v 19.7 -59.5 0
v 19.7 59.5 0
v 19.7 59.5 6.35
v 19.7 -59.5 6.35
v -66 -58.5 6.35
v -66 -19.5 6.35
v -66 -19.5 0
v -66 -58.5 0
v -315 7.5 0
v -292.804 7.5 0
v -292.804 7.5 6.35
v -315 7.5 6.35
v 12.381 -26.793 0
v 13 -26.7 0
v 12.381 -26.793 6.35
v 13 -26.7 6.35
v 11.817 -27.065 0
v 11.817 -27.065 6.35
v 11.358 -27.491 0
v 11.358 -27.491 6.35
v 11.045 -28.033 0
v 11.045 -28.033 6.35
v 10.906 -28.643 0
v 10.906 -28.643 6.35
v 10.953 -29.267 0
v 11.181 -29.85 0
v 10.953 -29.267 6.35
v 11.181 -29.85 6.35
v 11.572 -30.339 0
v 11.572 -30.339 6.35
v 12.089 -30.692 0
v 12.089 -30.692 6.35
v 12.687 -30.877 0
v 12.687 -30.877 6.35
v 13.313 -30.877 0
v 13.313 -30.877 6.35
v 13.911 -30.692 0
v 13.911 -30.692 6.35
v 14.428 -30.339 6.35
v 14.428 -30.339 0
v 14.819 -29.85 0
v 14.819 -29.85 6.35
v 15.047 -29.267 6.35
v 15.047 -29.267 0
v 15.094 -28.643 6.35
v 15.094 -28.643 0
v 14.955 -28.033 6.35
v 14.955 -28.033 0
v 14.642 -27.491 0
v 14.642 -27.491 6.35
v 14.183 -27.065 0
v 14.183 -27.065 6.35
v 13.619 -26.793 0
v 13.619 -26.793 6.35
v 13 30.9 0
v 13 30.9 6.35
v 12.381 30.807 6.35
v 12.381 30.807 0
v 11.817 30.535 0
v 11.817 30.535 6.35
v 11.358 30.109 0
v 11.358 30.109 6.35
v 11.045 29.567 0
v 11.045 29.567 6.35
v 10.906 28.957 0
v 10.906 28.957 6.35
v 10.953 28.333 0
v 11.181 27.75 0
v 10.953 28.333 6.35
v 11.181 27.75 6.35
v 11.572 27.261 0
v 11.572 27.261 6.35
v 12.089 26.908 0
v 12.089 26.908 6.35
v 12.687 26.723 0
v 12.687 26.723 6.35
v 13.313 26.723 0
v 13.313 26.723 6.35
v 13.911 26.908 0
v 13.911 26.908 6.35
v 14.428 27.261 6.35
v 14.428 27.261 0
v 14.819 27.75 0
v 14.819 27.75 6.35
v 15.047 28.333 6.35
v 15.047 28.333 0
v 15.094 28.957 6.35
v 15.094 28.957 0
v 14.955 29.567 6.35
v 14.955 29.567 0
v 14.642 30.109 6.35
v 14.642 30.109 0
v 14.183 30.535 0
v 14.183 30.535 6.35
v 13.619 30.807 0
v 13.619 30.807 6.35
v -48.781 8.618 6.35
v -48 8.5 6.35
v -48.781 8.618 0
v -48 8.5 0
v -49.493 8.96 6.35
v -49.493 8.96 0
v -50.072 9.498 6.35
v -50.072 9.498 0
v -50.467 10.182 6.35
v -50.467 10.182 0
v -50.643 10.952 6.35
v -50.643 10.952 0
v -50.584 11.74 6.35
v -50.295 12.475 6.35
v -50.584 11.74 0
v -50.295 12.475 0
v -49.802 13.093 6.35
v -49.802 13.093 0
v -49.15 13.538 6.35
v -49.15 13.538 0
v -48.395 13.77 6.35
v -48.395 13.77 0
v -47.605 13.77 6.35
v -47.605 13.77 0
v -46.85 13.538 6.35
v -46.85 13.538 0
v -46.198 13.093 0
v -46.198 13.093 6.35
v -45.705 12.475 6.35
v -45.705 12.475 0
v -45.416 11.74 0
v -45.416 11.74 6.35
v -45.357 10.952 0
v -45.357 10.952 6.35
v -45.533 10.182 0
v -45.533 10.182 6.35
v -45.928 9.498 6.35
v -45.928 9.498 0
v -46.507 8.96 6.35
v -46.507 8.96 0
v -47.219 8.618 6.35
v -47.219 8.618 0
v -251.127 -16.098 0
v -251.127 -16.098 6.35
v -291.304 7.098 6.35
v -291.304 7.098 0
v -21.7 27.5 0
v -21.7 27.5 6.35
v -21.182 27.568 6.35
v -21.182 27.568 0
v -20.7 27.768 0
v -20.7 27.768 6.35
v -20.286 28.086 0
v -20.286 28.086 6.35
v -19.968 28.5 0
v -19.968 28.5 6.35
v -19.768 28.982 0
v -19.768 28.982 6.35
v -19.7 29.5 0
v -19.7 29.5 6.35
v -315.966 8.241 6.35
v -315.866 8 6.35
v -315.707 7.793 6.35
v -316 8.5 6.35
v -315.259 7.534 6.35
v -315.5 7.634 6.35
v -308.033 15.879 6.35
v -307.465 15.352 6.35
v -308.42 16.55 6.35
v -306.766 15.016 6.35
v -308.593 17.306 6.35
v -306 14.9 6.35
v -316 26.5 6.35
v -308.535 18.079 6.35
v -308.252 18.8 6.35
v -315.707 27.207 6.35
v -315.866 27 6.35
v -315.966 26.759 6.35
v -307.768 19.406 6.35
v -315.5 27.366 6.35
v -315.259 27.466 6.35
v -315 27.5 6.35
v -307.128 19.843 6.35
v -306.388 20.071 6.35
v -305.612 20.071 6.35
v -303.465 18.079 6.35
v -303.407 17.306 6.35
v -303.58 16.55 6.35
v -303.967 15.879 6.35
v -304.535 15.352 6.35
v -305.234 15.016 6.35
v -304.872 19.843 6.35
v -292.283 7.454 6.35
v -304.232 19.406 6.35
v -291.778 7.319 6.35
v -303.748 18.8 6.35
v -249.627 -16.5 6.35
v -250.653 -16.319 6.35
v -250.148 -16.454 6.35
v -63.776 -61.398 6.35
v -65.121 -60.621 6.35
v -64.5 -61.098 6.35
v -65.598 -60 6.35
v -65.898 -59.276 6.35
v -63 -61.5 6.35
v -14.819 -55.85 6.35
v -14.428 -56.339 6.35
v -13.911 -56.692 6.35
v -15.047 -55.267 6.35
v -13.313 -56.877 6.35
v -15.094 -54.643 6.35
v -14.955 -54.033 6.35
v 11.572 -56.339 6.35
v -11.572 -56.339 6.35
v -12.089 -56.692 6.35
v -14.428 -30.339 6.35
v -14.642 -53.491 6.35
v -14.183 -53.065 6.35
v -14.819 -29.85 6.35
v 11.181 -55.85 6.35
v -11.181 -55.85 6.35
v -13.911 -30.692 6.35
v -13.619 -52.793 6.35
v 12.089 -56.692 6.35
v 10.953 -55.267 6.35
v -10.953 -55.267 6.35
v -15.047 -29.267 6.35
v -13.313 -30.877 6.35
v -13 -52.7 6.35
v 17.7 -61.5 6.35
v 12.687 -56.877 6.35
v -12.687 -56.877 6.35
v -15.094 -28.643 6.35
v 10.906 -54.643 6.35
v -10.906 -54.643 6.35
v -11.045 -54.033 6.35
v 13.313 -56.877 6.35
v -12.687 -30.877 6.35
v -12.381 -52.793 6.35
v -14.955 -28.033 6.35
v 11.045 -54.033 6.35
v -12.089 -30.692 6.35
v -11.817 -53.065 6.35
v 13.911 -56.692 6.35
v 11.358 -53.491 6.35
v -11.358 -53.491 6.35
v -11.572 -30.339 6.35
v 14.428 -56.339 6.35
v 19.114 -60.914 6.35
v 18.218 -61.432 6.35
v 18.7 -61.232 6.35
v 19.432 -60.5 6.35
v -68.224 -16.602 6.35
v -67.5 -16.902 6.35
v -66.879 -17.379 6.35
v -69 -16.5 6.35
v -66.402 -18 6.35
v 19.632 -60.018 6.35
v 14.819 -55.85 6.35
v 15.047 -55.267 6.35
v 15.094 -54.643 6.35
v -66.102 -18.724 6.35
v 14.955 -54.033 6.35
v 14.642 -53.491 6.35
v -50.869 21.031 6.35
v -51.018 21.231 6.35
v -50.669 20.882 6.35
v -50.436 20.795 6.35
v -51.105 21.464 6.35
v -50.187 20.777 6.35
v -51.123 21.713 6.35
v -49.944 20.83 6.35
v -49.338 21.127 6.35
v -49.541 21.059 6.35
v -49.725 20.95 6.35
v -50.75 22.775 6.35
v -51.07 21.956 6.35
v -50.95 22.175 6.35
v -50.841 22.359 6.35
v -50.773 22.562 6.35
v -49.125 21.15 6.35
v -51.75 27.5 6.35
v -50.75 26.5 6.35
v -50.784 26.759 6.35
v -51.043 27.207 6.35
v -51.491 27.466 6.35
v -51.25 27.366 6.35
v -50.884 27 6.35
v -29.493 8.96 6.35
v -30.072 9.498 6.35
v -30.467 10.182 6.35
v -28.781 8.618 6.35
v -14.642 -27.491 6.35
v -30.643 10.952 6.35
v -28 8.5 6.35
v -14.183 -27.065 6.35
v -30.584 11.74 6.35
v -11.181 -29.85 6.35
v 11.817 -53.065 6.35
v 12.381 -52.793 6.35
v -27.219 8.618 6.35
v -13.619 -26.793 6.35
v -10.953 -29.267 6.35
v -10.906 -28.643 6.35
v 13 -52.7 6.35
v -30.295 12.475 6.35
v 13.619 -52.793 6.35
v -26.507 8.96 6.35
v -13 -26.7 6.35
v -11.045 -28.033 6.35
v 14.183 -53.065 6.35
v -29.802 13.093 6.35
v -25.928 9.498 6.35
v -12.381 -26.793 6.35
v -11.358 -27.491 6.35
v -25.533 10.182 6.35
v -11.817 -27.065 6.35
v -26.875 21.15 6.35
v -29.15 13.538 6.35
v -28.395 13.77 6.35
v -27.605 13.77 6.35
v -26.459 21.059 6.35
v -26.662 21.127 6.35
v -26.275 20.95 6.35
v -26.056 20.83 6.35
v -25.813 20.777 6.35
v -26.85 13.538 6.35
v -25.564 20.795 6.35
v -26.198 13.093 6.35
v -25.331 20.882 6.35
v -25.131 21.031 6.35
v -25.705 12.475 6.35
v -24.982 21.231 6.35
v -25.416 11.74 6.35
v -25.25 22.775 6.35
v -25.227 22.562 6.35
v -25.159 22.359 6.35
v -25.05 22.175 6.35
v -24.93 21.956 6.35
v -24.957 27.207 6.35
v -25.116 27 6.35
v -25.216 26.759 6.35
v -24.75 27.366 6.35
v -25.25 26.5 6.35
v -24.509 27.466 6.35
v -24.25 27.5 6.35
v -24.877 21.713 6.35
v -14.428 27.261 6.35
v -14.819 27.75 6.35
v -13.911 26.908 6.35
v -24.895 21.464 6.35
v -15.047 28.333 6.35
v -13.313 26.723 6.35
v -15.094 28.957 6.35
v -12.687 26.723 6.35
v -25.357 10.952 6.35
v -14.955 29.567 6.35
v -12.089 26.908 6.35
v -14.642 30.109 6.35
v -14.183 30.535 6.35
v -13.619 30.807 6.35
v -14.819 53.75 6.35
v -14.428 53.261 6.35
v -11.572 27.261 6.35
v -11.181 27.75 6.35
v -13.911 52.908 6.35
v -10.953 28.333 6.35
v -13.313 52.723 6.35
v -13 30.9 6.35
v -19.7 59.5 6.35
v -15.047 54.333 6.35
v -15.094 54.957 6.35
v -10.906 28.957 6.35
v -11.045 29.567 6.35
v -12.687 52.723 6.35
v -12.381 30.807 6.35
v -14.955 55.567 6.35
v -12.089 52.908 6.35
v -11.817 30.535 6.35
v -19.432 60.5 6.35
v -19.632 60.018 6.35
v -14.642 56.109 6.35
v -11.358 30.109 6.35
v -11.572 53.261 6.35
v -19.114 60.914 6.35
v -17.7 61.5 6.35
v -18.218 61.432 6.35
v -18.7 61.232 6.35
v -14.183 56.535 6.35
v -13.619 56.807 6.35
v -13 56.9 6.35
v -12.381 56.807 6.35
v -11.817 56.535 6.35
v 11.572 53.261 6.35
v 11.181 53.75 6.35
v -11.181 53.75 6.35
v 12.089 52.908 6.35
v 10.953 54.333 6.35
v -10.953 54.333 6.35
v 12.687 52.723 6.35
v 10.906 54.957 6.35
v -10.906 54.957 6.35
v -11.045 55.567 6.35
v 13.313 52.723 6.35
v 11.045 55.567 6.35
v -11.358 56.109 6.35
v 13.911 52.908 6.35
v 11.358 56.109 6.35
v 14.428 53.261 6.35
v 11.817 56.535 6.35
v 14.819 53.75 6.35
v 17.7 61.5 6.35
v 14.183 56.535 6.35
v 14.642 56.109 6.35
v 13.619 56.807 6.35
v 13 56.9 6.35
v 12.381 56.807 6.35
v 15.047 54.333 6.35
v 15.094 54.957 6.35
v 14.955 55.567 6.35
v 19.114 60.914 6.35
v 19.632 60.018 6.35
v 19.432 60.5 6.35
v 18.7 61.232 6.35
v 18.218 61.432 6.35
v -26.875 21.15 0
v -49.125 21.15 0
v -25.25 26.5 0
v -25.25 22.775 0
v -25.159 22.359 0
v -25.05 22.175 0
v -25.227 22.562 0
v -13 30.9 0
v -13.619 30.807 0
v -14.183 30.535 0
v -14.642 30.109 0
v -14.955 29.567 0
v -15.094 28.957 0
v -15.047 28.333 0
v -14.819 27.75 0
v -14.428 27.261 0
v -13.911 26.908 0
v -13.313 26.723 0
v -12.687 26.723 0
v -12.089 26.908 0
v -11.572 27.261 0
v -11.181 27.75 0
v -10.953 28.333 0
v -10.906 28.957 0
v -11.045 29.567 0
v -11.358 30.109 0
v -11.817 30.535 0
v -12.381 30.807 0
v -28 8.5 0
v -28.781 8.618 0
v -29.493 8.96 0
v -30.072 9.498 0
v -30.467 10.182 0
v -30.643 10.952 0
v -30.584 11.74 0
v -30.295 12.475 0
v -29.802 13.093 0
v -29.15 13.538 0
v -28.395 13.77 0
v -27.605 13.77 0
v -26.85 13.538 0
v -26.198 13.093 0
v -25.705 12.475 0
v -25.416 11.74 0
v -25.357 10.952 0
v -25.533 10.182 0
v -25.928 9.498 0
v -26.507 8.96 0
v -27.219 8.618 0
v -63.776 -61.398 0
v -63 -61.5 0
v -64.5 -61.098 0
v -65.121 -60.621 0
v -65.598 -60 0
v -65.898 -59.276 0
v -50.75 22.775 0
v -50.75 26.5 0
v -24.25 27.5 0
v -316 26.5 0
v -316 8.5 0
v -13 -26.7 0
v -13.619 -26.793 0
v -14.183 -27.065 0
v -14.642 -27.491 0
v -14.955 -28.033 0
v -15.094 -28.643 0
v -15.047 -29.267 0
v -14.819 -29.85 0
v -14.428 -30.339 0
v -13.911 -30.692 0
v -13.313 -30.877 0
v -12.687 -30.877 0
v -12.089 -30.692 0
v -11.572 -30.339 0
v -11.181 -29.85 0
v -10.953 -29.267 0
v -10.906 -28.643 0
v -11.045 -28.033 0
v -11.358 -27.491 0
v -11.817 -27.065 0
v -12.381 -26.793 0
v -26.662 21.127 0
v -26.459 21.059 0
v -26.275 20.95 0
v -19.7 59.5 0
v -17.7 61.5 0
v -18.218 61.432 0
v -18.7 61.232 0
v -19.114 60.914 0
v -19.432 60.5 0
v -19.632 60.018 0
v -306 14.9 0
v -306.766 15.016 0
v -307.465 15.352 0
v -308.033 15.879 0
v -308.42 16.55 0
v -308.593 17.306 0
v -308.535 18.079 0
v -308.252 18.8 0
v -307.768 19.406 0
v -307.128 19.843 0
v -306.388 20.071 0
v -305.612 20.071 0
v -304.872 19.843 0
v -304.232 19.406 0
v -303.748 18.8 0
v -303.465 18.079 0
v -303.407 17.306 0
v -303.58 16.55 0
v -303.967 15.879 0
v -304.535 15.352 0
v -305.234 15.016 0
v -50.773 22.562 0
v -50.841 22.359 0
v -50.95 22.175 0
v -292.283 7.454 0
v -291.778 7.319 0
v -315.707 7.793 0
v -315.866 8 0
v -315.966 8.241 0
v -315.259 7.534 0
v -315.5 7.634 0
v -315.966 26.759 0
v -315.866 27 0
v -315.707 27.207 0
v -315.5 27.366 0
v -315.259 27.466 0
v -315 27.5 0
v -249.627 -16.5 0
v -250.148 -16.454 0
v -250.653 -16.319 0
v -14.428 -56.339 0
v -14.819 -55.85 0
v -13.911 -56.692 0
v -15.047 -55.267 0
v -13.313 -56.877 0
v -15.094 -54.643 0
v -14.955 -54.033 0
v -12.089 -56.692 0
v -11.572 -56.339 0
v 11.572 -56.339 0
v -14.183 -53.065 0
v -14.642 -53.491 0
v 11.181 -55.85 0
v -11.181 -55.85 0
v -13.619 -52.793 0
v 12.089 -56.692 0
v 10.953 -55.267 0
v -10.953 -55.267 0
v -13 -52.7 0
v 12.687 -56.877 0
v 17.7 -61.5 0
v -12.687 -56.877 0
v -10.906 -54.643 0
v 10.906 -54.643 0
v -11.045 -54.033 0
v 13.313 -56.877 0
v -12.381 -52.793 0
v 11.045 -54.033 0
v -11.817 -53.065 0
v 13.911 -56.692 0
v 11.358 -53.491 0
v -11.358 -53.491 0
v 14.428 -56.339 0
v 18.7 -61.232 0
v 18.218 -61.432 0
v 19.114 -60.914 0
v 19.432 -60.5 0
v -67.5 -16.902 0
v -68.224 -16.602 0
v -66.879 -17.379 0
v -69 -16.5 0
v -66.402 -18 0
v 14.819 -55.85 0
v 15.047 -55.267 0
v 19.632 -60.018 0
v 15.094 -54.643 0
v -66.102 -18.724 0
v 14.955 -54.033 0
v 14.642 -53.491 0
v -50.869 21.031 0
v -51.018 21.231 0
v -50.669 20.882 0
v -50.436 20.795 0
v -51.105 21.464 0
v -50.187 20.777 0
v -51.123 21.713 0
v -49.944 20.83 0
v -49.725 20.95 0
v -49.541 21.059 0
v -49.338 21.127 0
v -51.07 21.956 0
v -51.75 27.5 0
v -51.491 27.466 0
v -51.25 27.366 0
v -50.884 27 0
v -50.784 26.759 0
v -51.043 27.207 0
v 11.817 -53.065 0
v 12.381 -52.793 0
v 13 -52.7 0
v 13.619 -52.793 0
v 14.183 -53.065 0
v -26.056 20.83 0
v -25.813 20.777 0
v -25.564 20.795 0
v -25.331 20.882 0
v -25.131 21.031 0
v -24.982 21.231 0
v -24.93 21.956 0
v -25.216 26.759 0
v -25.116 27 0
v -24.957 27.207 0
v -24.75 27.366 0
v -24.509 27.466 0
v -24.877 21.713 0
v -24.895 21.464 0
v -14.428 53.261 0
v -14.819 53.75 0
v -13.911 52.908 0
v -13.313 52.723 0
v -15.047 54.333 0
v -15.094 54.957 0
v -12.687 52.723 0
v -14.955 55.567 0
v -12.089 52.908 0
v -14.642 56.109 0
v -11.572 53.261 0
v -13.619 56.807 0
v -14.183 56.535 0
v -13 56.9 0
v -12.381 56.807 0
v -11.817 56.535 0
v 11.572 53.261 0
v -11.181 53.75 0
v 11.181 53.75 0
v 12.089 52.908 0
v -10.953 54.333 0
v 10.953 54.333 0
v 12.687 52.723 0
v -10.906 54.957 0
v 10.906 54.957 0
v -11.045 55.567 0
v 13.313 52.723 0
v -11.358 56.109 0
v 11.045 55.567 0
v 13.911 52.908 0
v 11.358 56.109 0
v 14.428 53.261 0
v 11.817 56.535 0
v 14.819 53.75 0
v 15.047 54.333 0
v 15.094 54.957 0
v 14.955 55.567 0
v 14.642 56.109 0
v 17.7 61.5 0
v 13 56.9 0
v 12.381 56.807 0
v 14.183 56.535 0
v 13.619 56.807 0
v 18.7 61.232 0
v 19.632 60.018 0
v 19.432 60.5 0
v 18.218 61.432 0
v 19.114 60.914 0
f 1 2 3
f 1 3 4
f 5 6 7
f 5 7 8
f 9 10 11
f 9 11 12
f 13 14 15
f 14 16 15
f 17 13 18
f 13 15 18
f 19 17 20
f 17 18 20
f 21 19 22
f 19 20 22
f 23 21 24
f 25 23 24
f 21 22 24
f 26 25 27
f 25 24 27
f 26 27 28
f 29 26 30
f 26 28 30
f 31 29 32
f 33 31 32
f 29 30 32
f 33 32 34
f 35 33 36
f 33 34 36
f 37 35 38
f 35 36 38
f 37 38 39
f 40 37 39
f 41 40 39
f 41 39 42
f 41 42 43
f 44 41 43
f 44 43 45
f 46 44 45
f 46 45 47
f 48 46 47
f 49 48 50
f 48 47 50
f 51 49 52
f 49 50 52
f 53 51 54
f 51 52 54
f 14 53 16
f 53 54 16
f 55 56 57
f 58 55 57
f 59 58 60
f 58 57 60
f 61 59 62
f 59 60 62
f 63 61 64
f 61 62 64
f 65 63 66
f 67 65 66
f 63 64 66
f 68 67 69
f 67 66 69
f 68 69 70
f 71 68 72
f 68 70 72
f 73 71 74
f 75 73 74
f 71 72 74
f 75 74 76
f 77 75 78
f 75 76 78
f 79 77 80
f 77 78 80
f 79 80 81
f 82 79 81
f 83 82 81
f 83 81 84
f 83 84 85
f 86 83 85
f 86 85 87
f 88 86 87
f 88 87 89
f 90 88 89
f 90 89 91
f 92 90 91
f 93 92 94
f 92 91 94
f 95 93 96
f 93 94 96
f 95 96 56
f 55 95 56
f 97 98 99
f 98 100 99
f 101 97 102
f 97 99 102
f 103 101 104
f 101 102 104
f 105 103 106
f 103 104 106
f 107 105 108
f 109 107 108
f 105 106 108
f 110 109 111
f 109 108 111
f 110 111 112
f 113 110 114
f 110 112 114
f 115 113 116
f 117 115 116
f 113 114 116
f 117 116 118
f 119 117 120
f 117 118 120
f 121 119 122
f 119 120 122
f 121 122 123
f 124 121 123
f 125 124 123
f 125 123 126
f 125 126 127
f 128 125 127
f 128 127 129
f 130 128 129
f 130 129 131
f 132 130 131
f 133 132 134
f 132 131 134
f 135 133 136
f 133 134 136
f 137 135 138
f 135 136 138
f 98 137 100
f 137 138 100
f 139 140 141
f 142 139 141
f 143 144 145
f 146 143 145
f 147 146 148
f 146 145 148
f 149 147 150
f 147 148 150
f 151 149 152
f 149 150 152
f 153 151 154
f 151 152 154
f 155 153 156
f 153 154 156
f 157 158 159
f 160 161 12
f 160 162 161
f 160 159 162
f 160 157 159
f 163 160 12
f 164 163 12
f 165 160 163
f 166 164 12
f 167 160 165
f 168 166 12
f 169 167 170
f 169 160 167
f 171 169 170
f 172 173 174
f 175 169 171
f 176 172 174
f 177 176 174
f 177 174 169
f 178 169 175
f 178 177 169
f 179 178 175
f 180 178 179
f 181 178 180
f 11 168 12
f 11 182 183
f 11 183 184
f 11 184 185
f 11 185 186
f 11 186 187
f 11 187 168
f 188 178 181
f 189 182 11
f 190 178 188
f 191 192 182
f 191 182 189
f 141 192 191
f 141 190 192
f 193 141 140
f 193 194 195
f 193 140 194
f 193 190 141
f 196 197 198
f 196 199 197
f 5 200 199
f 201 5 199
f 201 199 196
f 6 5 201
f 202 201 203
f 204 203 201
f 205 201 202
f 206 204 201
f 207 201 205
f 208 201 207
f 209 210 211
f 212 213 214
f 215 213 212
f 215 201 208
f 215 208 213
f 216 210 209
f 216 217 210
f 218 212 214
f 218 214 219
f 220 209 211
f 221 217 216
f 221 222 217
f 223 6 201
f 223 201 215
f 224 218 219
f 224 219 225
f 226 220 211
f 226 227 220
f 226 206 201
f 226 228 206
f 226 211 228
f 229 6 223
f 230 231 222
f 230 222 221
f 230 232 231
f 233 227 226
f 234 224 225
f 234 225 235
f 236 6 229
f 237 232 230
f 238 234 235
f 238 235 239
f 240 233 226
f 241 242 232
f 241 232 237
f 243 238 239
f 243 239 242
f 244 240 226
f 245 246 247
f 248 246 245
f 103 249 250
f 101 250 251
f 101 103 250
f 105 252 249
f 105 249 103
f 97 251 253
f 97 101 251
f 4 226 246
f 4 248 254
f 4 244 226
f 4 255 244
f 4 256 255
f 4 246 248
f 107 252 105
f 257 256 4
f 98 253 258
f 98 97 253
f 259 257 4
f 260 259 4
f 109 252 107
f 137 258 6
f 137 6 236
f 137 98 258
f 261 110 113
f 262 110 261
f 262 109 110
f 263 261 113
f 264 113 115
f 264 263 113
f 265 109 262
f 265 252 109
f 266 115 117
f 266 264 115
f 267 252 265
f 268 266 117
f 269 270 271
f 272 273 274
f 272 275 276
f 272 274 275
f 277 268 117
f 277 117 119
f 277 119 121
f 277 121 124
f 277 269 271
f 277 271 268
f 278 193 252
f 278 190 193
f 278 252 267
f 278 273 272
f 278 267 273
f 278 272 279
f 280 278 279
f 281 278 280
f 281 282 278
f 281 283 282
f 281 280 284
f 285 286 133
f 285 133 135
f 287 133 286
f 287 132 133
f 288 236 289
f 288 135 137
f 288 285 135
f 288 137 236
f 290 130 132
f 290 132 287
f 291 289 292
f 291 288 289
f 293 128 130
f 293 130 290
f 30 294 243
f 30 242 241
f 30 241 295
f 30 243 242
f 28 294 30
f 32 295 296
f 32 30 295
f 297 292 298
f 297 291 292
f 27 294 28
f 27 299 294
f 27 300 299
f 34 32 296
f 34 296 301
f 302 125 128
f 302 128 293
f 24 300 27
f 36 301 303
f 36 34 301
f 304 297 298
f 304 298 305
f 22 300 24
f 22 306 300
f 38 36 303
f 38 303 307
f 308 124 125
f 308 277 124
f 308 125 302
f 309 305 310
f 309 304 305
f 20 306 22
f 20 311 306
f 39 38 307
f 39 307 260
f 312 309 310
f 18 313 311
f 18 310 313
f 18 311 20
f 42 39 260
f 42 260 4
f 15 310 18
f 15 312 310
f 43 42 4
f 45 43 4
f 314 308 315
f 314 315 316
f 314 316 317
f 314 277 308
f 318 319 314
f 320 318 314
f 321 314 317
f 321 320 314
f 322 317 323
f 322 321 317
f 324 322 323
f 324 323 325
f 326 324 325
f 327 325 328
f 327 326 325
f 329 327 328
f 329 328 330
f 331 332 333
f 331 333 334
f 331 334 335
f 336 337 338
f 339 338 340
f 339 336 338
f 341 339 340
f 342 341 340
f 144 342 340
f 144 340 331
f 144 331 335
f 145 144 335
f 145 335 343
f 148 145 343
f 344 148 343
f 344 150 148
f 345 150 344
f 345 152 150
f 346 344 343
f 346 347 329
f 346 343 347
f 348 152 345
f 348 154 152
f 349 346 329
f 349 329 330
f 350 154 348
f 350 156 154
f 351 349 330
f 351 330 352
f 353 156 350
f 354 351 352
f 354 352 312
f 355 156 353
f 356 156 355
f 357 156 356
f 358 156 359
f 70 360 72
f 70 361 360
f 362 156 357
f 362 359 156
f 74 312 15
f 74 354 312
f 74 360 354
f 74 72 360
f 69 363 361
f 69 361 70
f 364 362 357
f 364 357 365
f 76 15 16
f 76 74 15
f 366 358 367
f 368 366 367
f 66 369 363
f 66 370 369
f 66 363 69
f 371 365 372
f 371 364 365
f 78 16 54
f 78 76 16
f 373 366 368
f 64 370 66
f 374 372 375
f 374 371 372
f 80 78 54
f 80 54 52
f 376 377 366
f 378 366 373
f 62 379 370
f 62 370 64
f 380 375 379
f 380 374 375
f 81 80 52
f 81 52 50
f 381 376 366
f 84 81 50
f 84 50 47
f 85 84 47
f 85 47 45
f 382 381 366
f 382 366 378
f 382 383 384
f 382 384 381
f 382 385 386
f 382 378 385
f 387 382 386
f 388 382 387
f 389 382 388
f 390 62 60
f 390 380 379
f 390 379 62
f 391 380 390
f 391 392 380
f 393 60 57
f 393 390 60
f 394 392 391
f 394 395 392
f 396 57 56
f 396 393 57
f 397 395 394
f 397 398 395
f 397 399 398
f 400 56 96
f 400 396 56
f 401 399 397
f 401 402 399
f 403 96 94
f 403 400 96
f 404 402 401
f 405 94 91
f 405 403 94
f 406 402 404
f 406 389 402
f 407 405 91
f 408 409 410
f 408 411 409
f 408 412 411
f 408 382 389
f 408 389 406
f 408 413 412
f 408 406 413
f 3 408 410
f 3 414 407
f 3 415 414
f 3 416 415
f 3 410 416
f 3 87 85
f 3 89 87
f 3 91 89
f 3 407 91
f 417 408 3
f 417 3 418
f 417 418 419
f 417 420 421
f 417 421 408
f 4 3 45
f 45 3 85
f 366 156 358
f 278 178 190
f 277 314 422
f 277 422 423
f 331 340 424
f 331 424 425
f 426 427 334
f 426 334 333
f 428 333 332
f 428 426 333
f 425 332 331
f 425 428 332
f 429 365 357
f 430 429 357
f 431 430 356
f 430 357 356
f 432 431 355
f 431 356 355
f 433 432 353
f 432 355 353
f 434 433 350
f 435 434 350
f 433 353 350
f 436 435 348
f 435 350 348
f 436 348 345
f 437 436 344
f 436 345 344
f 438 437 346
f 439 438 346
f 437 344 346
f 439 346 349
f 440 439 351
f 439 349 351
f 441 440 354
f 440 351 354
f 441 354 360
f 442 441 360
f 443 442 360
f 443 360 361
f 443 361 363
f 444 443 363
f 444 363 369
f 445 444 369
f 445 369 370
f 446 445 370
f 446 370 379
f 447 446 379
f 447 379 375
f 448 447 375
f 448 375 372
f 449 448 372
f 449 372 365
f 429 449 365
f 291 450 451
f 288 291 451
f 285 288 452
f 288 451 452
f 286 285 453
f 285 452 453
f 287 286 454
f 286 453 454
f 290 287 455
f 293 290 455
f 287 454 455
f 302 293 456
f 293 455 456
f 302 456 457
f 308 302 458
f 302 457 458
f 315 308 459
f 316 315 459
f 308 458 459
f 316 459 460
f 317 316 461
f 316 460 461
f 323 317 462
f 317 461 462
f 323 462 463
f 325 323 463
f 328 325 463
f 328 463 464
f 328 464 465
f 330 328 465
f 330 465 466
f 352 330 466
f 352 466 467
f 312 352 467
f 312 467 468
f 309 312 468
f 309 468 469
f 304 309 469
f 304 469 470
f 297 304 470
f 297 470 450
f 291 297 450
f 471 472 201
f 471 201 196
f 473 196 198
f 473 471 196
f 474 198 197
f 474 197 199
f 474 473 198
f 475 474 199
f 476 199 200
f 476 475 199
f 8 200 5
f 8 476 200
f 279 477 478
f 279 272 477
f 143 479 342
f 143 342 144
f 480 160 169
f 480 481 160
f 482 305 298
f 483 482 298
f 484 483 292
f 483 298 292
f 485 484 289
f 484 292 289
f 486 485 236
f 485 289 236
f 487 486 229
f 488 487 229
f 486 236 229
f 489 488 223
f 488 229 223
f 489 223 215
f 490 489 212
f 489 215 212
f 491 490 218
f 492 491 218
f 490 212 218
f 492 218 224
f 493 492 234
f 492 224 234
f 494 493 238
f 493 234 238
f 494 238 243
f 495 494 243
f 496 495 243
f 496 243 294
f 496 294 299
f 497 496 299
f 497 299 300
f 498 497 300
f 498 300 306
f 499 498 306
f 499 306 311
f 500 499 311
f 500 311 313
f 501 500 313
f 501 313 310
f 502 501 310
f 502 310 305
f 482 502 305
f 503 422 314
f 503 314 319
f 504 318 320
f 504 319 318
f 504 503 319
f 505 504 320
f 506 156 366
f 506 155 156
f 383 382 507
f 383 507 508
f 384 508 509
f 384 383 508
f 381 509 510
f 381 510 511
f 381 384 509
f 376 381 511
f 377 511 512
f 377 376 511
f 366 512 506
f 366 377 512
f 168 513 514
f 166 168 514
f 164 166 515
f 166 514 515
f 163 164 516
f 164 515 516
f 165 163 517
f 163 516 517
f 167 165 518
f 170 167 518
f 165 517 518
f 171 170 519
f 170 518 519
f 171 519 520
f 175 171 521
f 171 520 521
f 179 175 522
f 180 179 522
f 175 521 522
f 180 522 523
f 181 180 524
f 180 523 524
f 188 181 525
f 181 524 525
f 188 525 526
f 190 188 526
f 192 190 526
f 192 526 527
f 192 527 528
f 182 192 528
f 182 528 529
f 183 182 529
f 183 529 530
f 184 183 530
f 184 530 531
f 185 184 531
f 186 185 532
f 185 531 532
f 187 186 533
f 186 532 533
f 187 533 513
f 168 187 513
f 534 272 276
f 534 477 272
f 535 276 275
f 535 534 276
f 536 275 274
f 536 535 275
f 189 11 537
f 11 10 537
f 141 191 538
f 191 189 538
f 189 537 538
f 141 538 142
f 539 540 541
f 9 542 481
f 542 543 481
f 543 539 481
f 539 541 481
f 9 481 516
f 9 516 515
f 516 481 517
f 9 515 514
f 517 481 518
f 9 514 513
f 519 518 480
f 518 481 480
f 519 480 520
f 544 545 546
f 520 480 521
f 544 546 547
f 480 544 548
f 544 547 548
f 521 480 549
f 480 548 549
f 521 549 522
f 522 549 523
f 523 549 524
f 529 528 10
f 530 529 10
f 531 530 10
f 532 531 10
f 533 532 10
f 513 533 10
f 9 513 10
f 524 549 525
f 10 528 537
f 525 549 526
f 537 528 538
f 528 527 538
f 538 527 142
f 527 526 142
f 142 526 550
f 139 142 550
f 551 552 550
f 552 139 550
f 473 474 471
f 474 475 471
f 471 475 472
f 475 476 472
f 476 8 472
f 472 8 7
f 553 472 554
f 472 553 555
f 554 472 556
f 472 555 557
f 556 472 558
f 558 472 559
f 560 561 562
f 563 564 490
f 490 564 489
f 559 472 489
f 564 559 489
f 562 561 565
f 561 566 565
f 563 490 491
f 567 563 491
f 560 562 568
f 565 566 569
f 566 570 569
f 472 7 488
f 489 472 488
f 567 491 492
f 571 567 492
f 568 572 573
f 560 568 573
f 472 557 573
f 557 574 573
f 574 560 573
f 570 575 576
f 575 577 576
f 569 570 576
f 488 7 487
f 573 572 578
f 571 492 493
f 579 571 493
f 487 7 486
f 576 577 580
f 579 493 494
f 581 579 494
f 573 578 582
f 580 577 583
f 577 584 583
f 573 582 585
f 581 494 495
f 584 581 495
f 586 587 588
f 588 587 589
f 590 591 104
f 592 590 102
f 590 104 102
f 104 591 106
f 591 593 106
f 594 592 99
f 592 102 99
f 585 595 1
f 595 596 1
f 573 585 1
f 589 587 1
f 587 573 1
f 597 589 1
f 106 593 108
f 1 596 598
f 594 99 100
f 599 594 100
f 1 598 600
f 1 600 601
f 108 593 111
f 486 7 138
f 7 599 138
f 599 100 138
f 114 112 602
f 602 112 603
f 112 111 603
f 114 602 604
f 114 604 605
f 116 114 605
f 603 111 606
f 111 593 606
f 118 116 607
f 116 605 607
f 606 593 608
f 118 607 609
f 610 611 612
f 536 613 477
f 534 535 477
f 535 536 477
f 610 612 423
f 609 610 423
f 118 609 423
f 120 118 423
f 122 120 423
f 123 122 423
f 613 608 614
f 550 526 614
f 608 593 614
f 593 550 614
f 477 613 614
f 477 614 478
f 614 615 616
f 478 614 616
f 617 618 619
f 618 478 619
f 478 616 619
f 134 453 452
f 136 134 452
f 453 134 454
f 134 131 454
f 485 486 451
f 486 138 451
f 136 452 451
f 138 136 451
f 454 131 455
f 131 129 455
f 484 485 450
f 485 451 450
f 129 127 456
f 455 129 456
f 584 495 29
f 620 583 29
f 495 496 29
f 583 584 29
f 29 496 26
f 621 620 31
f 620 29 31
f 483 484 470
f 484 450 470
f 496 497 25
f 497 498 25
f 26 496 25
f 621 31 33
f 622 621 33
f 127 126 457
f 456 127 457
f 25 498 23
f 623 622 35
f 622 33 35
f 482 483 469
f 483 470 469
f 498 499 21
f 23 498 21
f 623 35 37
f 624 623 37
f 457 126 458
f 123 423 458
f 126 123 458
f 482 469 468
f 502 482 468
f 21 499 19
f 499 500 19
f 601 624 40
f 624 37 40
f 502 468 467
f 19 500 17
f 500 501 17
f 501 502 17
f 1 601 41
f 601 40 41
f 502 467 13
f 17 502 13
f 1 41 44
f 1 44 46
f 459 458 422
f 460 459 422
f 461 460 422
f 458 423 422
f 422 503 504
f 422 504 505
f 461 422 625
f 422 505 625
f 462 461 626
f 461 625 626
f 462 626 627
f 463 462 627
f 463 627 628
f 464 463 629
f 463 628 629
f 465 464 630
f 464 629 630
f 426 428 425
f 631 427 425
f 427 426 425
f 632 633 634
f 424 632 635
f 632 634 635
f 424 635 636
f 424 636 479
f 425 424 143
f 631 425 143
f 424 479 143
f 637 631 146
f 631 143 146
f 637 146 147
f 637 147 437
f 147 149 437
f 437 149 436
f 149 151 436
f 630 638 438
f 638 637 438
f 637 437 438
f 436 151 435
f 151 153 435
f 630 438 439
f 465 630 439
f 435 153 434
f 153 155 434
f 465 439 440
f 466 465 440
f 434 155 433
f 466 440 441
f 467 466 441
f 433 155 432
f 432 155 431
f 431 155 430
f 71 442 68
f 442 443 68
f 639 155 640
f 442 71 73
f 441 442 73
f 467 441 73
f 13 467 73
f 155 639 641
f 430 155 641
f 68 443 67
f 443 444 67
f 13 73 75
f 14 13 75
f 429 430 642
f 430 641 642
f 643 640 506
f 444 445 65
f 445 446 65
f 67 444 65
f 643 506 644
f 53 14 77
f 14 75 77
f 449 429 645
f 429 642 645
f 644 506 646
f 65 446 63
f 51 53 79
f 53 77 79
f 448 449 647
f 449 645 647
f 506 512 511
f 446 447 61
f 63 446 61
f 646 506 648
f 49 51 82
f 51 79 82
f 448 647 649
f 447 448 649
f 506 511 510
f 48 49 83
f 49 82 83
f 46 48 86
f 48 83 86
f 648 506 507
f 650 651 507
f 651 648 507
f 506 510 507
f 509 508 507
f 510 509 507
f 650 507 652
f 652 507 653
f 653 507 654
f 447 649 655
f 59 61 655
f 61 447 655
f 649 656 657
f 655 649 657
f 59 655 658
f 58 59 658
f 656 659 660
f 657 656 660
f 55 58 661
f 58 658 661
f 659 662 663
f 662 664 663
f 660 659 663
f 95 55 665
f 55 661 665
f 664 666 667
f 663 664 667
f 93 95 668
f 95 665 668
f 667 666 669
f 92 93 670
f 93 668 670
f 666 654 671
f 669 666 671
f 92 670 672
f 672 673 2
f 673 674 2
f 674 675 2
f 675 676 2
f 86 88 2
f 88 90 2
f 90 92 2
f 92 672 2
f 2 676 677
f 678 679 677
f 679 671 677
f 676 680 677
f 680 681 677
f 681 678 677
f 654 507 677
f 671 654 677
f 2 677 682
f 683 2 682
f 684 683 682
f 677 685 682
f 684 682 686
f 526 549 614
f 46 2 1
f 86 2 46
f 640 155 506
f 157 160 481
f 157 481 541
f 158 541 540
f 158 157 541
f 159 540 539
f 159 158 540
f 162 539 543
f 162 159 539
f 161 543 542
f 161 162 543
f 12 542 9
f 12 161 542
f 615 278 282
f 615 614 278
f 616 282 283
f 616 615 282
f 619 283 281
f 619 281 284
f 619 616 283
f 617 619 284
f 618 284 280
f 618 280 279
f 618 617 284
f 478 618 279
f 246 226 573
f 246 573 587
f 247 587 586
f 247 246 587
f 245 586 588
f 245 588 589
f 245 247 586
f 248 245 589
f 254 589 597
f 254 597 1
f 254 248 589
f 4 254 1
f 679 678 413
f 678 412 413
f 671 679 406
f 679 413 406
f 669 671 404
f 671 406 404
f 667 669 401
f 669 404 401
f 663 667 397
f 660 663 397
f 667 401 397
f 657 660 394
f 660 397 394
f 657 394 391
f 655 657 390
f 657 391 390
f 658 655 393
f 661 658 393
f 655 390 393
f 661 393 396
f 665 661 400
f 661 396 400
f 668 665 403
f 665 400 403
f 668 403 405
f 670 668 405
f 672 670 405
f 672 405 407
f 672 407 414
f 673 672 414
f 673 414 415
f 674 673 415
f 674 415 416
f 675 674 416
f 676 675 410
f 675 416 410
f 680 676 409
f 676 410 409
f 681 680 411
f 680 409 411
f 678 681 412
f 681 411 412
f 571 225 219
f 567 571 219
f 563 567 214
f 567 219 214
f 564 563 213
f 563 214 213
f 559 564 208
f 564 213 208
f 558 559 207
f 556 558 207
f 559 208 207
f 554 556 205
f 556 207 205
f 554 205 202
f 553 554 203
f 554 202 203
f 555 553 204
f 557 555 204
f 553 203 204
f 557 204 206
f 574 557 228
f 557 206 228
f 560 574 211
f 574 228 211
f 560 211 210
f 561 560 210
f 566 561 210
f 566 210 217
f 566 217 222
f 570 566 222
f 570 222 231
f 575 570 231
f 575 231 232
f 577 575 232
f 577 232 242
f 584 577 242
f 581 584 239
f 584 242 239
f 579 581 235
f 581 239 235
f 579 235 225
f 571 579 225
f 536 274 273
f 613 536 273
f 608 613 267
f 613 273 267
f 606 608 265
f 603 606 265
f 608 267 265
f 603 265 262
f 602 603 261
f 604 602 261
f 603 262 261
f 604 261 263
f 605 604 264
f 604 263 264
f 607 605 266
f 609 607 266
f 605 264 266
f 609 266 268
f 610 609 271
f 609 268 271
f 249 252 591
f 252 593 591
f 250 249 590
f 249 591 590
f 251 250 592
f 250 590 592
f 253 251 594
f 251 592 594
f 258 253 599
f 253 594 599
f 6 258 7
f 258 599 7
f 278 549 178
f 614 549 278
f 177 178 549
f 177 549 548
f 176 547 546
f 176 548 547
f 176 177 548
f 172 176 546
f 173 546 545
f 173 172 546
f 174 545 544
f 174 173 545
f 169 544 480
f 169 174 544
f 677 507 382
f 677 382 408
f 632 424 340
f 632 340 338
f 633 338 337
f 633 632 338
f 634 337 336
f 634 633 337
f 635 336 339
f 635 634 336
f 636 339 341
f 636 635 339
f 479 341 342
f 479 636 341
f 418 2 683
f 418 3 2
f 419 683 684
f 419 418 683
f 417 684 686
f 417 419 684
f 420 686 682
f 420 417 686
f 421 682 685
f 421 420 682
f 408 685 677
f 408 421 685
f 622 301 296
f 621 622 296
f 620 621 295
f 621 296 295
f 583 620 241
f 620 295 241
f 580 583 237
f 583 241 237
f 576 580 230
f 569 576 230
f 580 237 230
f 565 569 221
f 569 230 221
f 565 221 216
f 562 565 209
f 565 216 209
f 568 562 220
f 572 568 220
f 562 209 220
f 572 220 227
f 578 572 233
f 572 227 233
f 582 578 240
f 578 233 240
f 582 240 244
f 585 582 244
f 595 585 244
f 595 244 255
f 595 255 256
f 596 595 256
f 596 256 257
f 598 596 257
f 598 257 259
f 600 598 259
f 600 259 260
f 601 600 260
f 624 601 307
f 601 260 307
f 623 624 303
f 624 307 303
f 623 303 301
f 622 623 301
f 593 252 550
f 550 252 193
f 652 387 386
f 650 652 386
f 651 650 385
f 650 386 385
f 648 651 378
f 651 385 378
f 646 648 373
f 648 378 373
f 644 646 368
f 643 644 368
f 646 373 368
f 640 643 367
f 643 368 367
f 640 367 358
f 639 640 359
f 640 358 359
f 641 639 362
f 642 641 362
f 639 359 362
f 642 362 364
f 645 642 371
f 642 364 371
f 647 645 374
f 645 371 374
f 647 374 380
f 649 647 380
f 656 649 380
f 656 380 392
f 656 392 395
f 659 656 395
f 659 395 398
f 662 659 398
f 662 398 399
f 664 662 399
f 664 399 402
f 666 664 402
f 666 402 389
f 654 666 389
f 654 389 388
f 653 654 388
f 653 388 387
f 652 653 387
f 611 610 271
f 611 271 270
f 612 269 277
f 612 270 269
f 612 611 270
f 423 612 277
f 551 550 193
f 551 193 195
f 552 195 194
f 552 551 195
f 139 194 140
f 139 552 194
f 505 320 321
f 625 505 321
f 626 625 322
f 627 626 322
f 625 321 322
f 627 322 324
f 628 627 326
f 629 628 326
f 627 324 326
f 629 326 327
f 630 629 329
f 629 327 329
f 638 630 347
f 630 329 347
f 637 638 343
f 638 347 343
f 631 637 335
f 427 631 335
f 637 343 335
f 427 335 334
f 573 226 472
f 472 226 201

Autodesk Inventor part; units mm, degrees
ref_plane "YZ Plane" through (0, 0, 0) normal (1, 0, 0) x (0, 1, 0)
ref_plane "XZ Plane" through (0, 0, 0) normal (0, 1, 0) x (-1, 0, 0)
sketch "Sketch1" plane through (0, 0, 0) normal (0, 0, 1) x (1, 0, 0)
  line L0 (19.7, -72.5) -> (-19.7, -72.5)
  line L1 (-19.7, -72.5) -> (-19.7, 72.5)
  line L2 (-19.7, 72.5) -> (19.7, 72.5)
  line L3 (19.7, 72.5) -> (19.7, -72.5)
  line L4 (19.7, -72.5) -> (-19.7, 72.5) construction
  line L5 (-19.7, -72.5) -> (19.7, 72.5) construction
  line L6 (19.7, 11.1) -> (-19.7, 11.1) construction
  line L7 (-19.7, 11.1) -> (-19.7, 72.5) construction
  line L8 (-19.7, 72.5) -> (19.7, 72.5) construction
  line L9 (19.7, 72.5) -> (19.7, 11.1) construction
  line L10 (19.7, 11.1) -> (-19.7, 72.5) construction
  line L11 (-19.7, 11.1) -> (19.7, 72.5) construction
  line L12 (19.7, -72.5) -> (-19.7, -72.5) construction
  line L13 (-19.7, -72.5) -> (-19.7, -11.1) construction
  line L14 (-19.7, -11.1) -> (19.7, -11.1) construction
  line L15 (19.7, -11.1) -> (19.7, -72.5) construction
  line L16 (19.7, -72.5) -> (-19.7, -11.1) construction
  line L17 (-19.7, -72.5) -> (19.7, -11.1) construction
  line L18 (19.7, 22.1) -> (-19.7, 22.1) construction
  line L19 (-19.7, 22.1) -> (-19.7, 61.5) construction
  line L20 (-19.7, 61.5) -> (19.7, 61.5)
  line L21 (19.7, 61.5) -> (19.7, 22.1) construction
  line L22 (19.7, 22.1) -> (-19.7, 61.5) construction
  line L23 (-19.7, 22.1) -> (19.7, 61.5) construction
  line L24 (19.7, -61.5) -> (-19.7, -61.5)
  line L25 (-19.7, -61.5) -> (-19.7, -22.1) construction
  line L26 (-19.7, -22.1) -> (19.7, -22.1) construction
  line L27 (19.7, -22.1) -> (19.7, -61.5) construction
  line L28 (19.7, -61.5) -> (-19.7, -22.1) construction
  line L29 (-19.7, -61.5) -> (19.7, -22.1) construction
  line L30 (13, 28.8) -> (-13, 28.8) construction
  line L31 (-13, 28.8) -> (-13, 54.8) construction
  line L32 (-13, 54.8) -> (13, 54.8) construction
  line L33 (13, 54.8) -> (13, 28.8) construction
  line L34 (13, 28.8) -> (-13, 54.8) construction
  line L35 (-13, 28.8) -> (13, 54.8) construction
  line L36 (13, -54.8) -> (-13, -54.8) construction
  line L37 (-13, -54.8) -> (-13, -28.8) construction
  line L38 (-13, -28.8) -> (13, -28.8) construction
  line L39 (13, -28.8) -> (13, -54.8) construction
  line L40 (13, -54.8) -> (-13, -28.8) construction
  line L41 (-13, -54.8) -> (13, -28.8) construction
  line L42 (-316, 27.5) -> (-19.7, 27.5)
  line L43 (-19.7, 27.5) -> (-19.7, 7.5)
  line L44 (-19.7, 7.5) -> (-316, 7.5)
  line L45 (-316, 7.5) -> (-316, 27.5)
  line L46 (19.7, -63.5) -> (19.7, -63.5)
  line L47 (19.772, 73.498) -> (19.772, 73.498)
  point P0 (0, 0)
  point P1 (0, 41.8)
  point P2 (0, -41.8)
  point P3 (-316, 17.5)
  point P4 (-291, 7.5)
  point P5 (17, 72.5)
  point P6 (17, -72.5)
  point P7 (-19.7, 27.5)
  point P8 (-19.7, 7.5)
  point P9 (-19.7, -61.5)
  point P10 (19.7, -61.5)
  dimension "d1" = 145
  dimension "d2" = 61.4
  dimension "d3" = 39.4
  dimension "d4" = 26
  dimension "d5" = 26
  dimension "d6" = 20
  dimension "d8" = 316
  dimension "d11" = 25
  dimension "d55" = 45
  dimension "d126" = 6.7
  dimension "d128" = 6.7
extrude "Extrusion1" add sketch "Sketch1" along normal blind 6.35 contours L24 L1 L20 L3 | L44 L45 L42 L1
sketch "Sketch2" plane through (0, 0, 6.35) normal (0, 0, 1) x (1, 0, 0)
  line L0 (19.7, -61.5) -> (19.7, 61.5) projected
  line L1 (-19.7, 61.5) -> (-19.7, 27.5) projected
  line L2 (-19.7, 27.5) -> (-316, 27.5) projected
  line L3 (-316, 27.5) -> (-316, 7.5) projected
  line L4 (-316, 7.5) -> (-19.7, 7.5) projected
  line L5 (-19.7, 7.5) -> (-19.7, -61.5) projected
  line L6 (19.7, -61.5) -> (-19.7, -61.5) construction
  line L7 (-19.7, -61.5) -> (19.7, -61.5) projected
  line L8 (19.7, 61.5) -> (-19.7, 61.5) projected
  line L9 (-19.7, -61.5) -> (-66, -61.5)
  line L10 (-66, -16.5) -> (-250.4308, -16.5)
  line L11 (-250.4308, -16.5) -> (-292, 7.5)
  line L12 (-66, -16.5) -> (-66, -61.5)
  point P0 (0, 0)
  point P1 (0, 41.8)
  point P2 (0, -41.8)
  point P3 (13, 28.8)
  point P4 (13, -28.8)
  dimension "d25" = 24
  dimension "d124" = 34
  dimension "d140" = 24
  dimension "d142" = 85.7
  dimension "d143" = 150
extrude "Extrusion2" add sketch "Sketch2" against normal up to surface (6.35 mm away) contours L9 L12 L10 L11 L4 L5
hole "Hole1" at (-13, 54.8, 0) at (13, 54.8, 0) at (13, 28.8, 0) at (-13, 28.8, 0) at (-13, -28.8, 0) at (13, -28.8, 0) at (13, -54.8, 0) at (-13, -54.8, 0) direction (0, 0, 1) diameter 4.2 end through all
sketch "Z POSITIONING" plane through (0, 0, 6.35) normal (0, 0, 1) x (1, 0, 0)
  circle A0 centre (-13, -54.8) radius 2.1 projected
  circle A1 centre (13, -54.8) radius 2.1 projected
  circle A2 centre (13, -28.8) radius 2.1 projected
  circle A3 centre (-13, -28.8) radius 2.1 projected
  circle A4 centre (-13, 28.8) radius 2.1 projected
  circle A5 centre (13, 28.8) radius 2.1 projected
  circle A6 centre (13, 54.8) radius 2.1 projected
  circle A7 centre (-13, 54.8) radius 2.1 projected
  line L0 (-19.7, 27.5) -> (-316, 27.5) projected
  line L1 (-316, 27.5) -> (-316, 7.5) projected
  line L2 (-316, 7.5) -> (-292, 7.5) projected
  line L3 (-73.0306, 76.9979) -> (-73.0306, 70.6479)
  line L4 (-13, 54.8) -> (13, 54.8) construction
  line L5 (-51.9212, 35.5) -> (-16.9212, 35.5) construction
  line L6 (-16.9212, 35.5) -> (-16.9212, 27.5) construction
  line L7 (-16.9212, 27.5) -> (-51.9212, 27.5) construction
  line L8 (-51.9212, 27.5) -> (-51.9212, 35.5) construction
  line L9 (-51.9212, 69.65) -> (-6.1684, 69.65) construction
  line L10 (-125.0107, 76) -> (3.0638, 76) construction
  line L11 (3.0638, 76) -> (3.0638, 69.65) construction
  line L12 (3.0638, 69.65) -> (-125.0107, 69.65) construction
  line L13 (-125.0107, 69.65) -> (-125.0107, 76) construction
  line L14 (-120.28, 89) -> (-45.2895, 89) construction
  line L15 (-45.2895, 89) -> (-45.2895, 76) construction
  line L16 (-45.2895, 76) -> (-120.28, 76) construction
  line L17 (-120.28, 76) -> (-120.28, 89) construction
  line L18 (-46.2871, 30.7481) -> (-33.7765, 30.7481) construction
  line L19 (-33.7765, 30.7481) -> (-33.7765, 27.5) construction
  line L20 (-33.7765, 27.5) -> (-46.2871, 27.5) construction
  line L21 (-46.2871, 27.5) -> (-46.2871, 30.7481) construction
  line L22 (-83.6356, 76.3105) -> (-20.2105, 76.3105) construction
  line L23 (-20.2105, 76.3105) -> (-20.2105, 72.407) construction
  line L24 (-20.2105, 72.407) -> (-83.6356, 72.407) construction
  line L25 (-83.6356, 72.407) -> (-83.6356, 76.3105) construction
  line L26 (-72.5883, 73.6984) -> (-50.3384, 73.6984) construction
  line L27 (-50.3384, 73.6984) -> (-50.3384, 69.65) construction
  line L28 (-50.3384, 69.65) -> (-72.5883, 69.65) construction
  line L29 (-72.5883, 69.65) -> (-72.5883, 73.6984) construction
  line L30 (-111.3546, 80.0484) -> (-73.1953, 80.0484) construction
  line L31 (-73.1953, 80.0484) -> (-73.1953, 76) construction
  line L32 (-73.1953, 76) -> (-111.3546, 76) construction
  line L33 (-111.3546, 76) -> (-111.3546, 80.0484) construction
  line L34 (-122.3616, 95.35) -> (-60.8324, 95.35) construction
  line L35 (-60.8324, 95.35) -> (-60.8324, 89) construction
  line L36 (-60.8324, 89) -> (-122.3616, 89) construction
  line L37 (-122.3616, 89) -> (-122.3616, 95.35) construction
  line L38 (-97.4496, 108.35) -> (-64.4997, 108.35) construction
  line L39 (-64.4997, 108.35) -> (-64.4997, 95.35) construction
  line L40 (-64.4997, 95.35) -> (-97.4496, 95.35) construction
  line L41 (-97.4496, 95.35) -> (-97.4496, 108.35) construction
  line L42 (-105.6043, 93.0261) -> (-84.5103, 93.0261) construction
  line L43 (-84.5103, 93.0261) -> (-84.5103, 89) construction
  line L44 (-84.5103, 89) -> (-105.6043, 89) construction
  line L45 (-105.6043, 89) -> (-105.6043, 93.0261) construction
  line L46 (-109.4941, 99.3984) -> (-71.3471, 99.3984) construction
  line L47 (-71.3471, 99.3984) -> (-71.3471, 95.35) construction
  line L48 (-71.3471, 95.35) -> (-109.4941, 95.35) construction
  line L49 (-109.4941, 95.35) -> (-109.4941, 99.3984) construction
  line L50 (-134.6087, 111.525) -> (-34.6087, 111.525) construction
  line L51 (-34.6087, 111.525) -> (-34.6087, 108.35) construction
  line L52 (-34.6087, 108.35) -> (-134.6087, 108.35) construction
  line L53 (-134.6087, 108.35) -> (-134.6087, 111.525) construction
  line L54 (-97.1464, 115.5511) -> (-69.166, 115.5511) construction
  line L55 (-69.166, 115.5511) -> (-69.166, 111.525) construction
  line L56 (-69.166, 111.525) -> (-97.1464, 111.525) construction
  line L57 (-97.1464, 111.525) -> (-97.1464, 115.5511) construction
  line L58 (-143.7669, 61.65) -> (-108.5896, 61.65) construction
  line L59 (-148.1315, 61.65) -> (-115.878, 61.65) construction
  line L60 (-115.878, 61.65) -> (-115.878, 58.4884) construction
  line L61 (-115.878, 58.4884) -> (-148.1315, 58.4884) construction
  line L62 (-148.1315, 58.4884) -> (-148.1315, 61.65) construction
  line L63 (-66, -61.5) -> (19.7, -61.5) projected
  line L64 (-19.7, 61.5) -> (-19.7, 27.5) projected
  line L65 (19.7, -61.5) -> (19.7, 61.5) projected
  line L66 (19.7, 61.5) -> (-19.7, 61.5) projected
  line L67 (-292, 7.5) -> (-250.4308, -16.5) projected
  line L68 (-250.4308, -16.5) -> (-66, -16.5) projected
  line L69 (-66, -16.5) -> (-66, -61.5) projected
  point P0 (0, 0)
  point P1 (0, 54.8)
  dimension "d39" = 6.35
  dimension "d42" = 35
  dimension "d43" = 8
  dimension "d44" = 34.15
  dimension "d45" = 6.35
  dimension "d46" = 13
  dimension "d48" = 6.35
  dimension "d49" = 13
  dimension "d50" = 100
  dimension "d51" = 3.175
  dimension "d52" = 46.7
  dimension "d53" = 34.15
ref_plane "PRINTBED PLANE" through (-316, 61.65, 6.35) normal (0, 1, 0) x (1, 0, 0)
sketch "Y POSITIONING" plane through (0, 0, 6.35) normal (0, 0, 1) x (1, 0, 0)
  line L0 (-315, 61.65) -> (-29, 61.65) construction
  line L1 (-306, 61.65) -> (-306, 54.4706) construction
  line L2 (-38, 61.65) -> (-38, 46.65) construction
  line L3 (-316, 27.5) -> (-316, 7.5) projected
  line L4 (-32, 27.5) -> (-44, 27.5) construction
  line L5 (-44, 27.5) -> (-44, 61.65) construction
  line L6 (-44, 61.65) -> (-32, 61.65) construction
  line L7 (-32, 61.65) -> (-32, 27.5) construction
  line L8 (-32, 27.5) -> (-44, 61.65) construction
  line L9 (-44, 27.5) -> (-32, 61.65) construction
  line L10 (-19.7, 27.5) -> (-316, 27.5) projected
  circle A0 centre (-13, -54.8) radius 2.1 projected
  circle A1 centre (13, -54.8) radius 2.1 projected
  circle A2 centre (13, -28.8) radius 2.1 projected
  circle A3 centre (-13, -28.8) radius 2.1 projected
  circle A4 centre (-13, 28.8) radius 2.1 projected
  circle A5 centre (13, 28.8) radius 2.1 projected
  circle A6 centre (13, 54.8) radius 2.1 projected
  circle A7 centre (-13, 54.8) radius 2.1 projected
  line L11 (-19.7, 27.5) -> (-316, 27.5) projected
  line L12 (-316, 27.5) -> (-316, 7.5) projected
  line L13 (-316, 7.5) -> (-292, 7.5) projected
  line L14 (-13, 54.8) -> (13, 28.8) construction
  line L15 (-383.14, 61.65) -> (86.84, 61.65) construction
  line L16 (-53, 27.5) -> (-23, 27.5) construction
  line L17 (-23, 27.5) -> (-23, 35.5) construction
  line L18 (-23, 35.5) -> (-53, 35.5) construction
  line L19 (-53, 35.5) -> (-53, 27.5) construction
  line L20 (-53, 27.5) -> (-23, 35.5) construction
  line L21 (-23, 27.5) -> (-53, 35.5) construction
  line L22 (-66, -61.5) -> (19.7, -61.5) projected
  line L23 (-58, 21.15) -> (-18, 21.15) construction
  line L24 (-18, 21.15) -> (-18, 1.15) construction
  line L25 (-18, 1.15) -> (-58, 1.15) construction
  line L26 (-58, 1.15) -> (-58, 21.15) construction
  line L27 (-48, 11.15) -> (-28, 11.15) construction
  line L28 (-19.7, 61.5) -> (-19.7, 27.5) projected
  line L29 (19.7, -61.5) -> (19.7, 61.5) projected
  line L30 (19.7, 61.5) -> (-19.7, 61.5) projected
  line L31 (-292, 7.5) -> (-250.4308, -16.5) projected
  line L32 (-250.4308, -16.5) -> (-66, -16.5) projected
  line L33 (-66, -16.5) -> (-66, -61.5) projected
  point P0 (0, 0)
  point P1 (-38, 44.575)
  point P2 (-32, 47.5)
  point P3 (0, 41.8)
  point P4 (-38, 31.5)
  point P5 (-38, 27.5)
  point P6 (-38, 21.15)
  point P7 (-38, 11.15)
  point P8 (-18, 11.15)
  dimension "d58" = 286
  dimension "d60" = 9
  dimension "d61" = 10
  dimension "d62" = 12
  dimension "d63" = 38
  dimension "d64" = 9
  dimension "d65" = 30
  dimension "d66" = 8
  dimension "d67" = 15
  dimension "d68" = 19.15
  dimension "d83" = 40
  dimension "d84" = 20
  dimension "d85" = 6.35
  dimension "d90" = 20
sketch "Sketch5" plane through (0, 0, 6.35) normal (0, 0, 1) x (1, 0, 0)
  line L0 (-296, 7.5) -> (-316, 7.5) construction
  line L1 (-316, 7.5) -> (-316, 27.5) construction
  line L2 (-316, 27.5) -> (-296, 27.5) construction
  line L3 (-296, 27.5) -> (-296, 7.5) construction
  line L4 (-296, 7.5) -> (-316, 27.5) construction
  line L5 (-316, 7.5) -> (-296, 27.5) construction
  point P0 (0, 0)
  point P1 (-306, 17.5)
  point P2 (-306, 17.5)
hole "Hole2" at (-306, 17.5, 6.35) direction (0, 0, -1) diameter 5.2 end through all
sketch "Sketch6" plane through (0, 0, 6.35) normal (0, 0, 1) x (1, 0, 0)
  line L0 (-50.75, 27.5) -> (-25.25, 27.5)
  line L1 (-25.25, 27.5) -> (-25.25, 21.15)
  line L2 (-25.25, 21.15) -> (-50.75, 21.15)
  line L3 (-50.75, 21.15) -> (-50.75, 27.5)
  line L4 (-38, 61.65) -> (-38, 46.65) construction
  line L5 (-19.7, 27.5) -> (-316, 27.5) projected
  line L6 (-58, 21.15) -> (-18, 21.15) construction
  circle A0 centre (-50.25, 21.65) radius 0.875
  circle A1 centre (-25.75, 21.65) radius 0.875
  point P0 (0, 0)
  point P1 (-38, 27.5)
  point P2 (-32, 47.5)
  point P3 (-26.4681, 21.15)
  point P4 (-25.25, 22.3681)
  point P5 (-50.75, 22.3681)
  point P6 (-49.5319, 21.15)
  dimension "d79" = 25.5
  dimension "d86" = 1.75
  dimension "d87" = 0.5
  dimension "d88" = 0.5
  dimension "d89" = 0.5
extrude "Extrusion3" cut sketch "Sketch6" against normal through all
hole "Hole3" at (-48, 11.15, 6.35) at (-28, 11.15, 6.35) direction (0, 0, -1) diameter 5.3 end through all
sketch "Sketch9" plane through (0, 0, 6.35) normal (0, 0, 1) x (1, 0, 0)
  circle A0 centre (-28, 11.15) radius 2.65 projected
  circle A1 centre (-48, 11.15) radius 2.65 projected
  line L0 (-50.75, 22.3681) -> (-50.75, 27.5) projected
  line L1 (-50.75, 27.5) -> (-316, 27.5) projected
  line L2 (-316, 27.5) -> (-316, 7.5) projected
  line L3 (-316, 7.5) -> (-292, 7.5) projected
  line L4 (-66, -61.5) -> (19.7, -61.5) projected
  line L5 (-25.25, 27.5) -> (-25.25, 22.3681) projected
  arc A2 (-26.4681, 21.15) -> (-25.25, 22.3681) centre (-25.75, 21.65) ccw projected
  line L6 (-26.4681, 21.15) -> (-49.5319, 21.15) projected
  arc A3 (-50.75, 22.3681) -> (-49.5319, 21.15) centre (-50.25, 21.65) ccw projected
  circle A4 centre (-306, 17.5) radius 2.6 projected
  circle A5 centre (-13, -54.8) radius 2.1 projected
  circle A6 centre (13, -54.8) radius 2.1 projected
  circle A7 centre (13, -28.8) radius 2.1 projected
  circle A8 centre (-13, -28.8) radius 2.1 projected
  circle A9 centre (-13, 28.8) radius 2.1 projected
  circle A10 centre (13, 28.8) radius 2.1 projected
  circle A11 centre (13, 54.8) radius 2.1 projected
  circle A12 centre (-13, 54.8) radius 2.1 projected
  line L7 (-19.7, 61.5) -> (-19.7, 27.5) projected
  line L8 (19.7, -61.5) -> (19.7, 61.5) projected
  line L9 (19.7, 61.5) -> (-19.7, 61.5) projected
  line L10 (-19.7, 27.5) -> (-25.25, 27.5) projected
  line L11 (-292, 7.5) -> (-250.4308, -16.5) projected
  line L12 (-250.4308, -16.5) -> (-66, -16.5) projected
  line L13 (-66, -16.5) -> (-66, -61.5) projected
  point P0 (0, 0)
fillet "Fillet3" radius 1 8 edges at (-316, 27.5, 3.175) (-316, 7.5, 3.175) (-50.75, 27.5, 3.175) (-50.75, 22.3681, 3.175) (-49.5319, 21.15, 3.175) (-26.4681, 21.15, 3.175) (-25.25, 22.3681, 3.175) (-25.25, 27.5, 3.175)
fillet "Fillet4" radius 3 4 edges at (-66, -61.5, 3.175) (-250.4308, -16.5, 3.175) (-66, -16.5, 3.175) (-292, 7.5, 3.175)
fillet "Fillet5" radius 2 4 edges at (-19.7, 27.5, 3.175) (-19.7, 61.5, 3.175) (19.7, 61.5, 3.175) (19.7, -61.5, 3.175)
sketch "Sketch10" plane through (0, 0, 6.35) normal (0, 0, 1) x (1, 0, 0)
  line L0 (-163.15, 17.9395) -> (-148.15, 26.5998)
  line L1 (-148.15, 26.5998) -> (-133.15, 17.9395)
  line L2 (-133.15, 17.9395) -> (-133.15, 0.619)
  line L3 (-133.15, 0.619) -> (-148.15, -8.0412)
  line L4 (-148.15, -8.0412) -> (-163.15, 0.619)
  line L5 (-163.15, 0.619) -> (-163.15, 17.9395)
  arc A0 (17.7, -59) -> (19.7, -57) centre (17.7, -57) ccw projected
  line L6 (19.7, -57) -> (19.7, 57) projected
  arc A1 (19.7, 57) -> (17.7, 59) centre (17.7, 57) ccw projected
  line L7 (17.7, 59) -> (-17.7, 59) projected
  arc A2 (-17.7, 59) -> (-19.7, 57) centre (-17.7, 57) ccw projected
  line L8 (-19.7, 57) -> (-19.7, 42) projected
  arc A3 (-21.7, 40) -> (-19.7, 42) centre (-21.7, 42) ccw projected
  line L9 (-21.7, 40) -> (-24.25, 40) projected
  arc A4 (-24.25, 40) -> (-25.25, 39) centre (-24.25, 39) ccw projected
  line L10 (-25.25, 39) -> (-25.25, 35.275) projected
  arc A5 (-25.25, 35.275) -> (-25.05, 34.675) centre (-24.25, 35.275) ccw projected
  arc A6 (-26.275, 33.45) -> (-25.05, 34.675) centre (-25.75, 34.15) ccw projected
  arc A7 (-26.275, 33.45) -> (-26.875, 33.65) centre (-26.875, 32.65) ccw projected
  line L11 (-26.875, 33.65) -> (-49.125, 33.65) projected
  arc A8 (-49.125, 33.65) -> (-49.725, 33.45) centre (-49.125, 32.65) ccw projected
  arc A9 (-50.95, 34.675) -> (-49.725, 33.45) centre (-50.25, 34.15) ccw projected
  arc A10 (-50.95, 34.675) -> (-50.75, 35.275) centre (-51.75, 35.275) ccw projected
  line L12 (-50.75, 35.275) -> (-50.75, 39) projected
  arc A11 (-50.75, 39) -> (-51.75, 27.5) centre (-51.75, 39) ccw projected
  line L13 (-51.75, 40) -> (-315, 40) projected
  arc A12 (-315, 27.5) -> (-316, 39) centre (-315, 39) ccw projected
  line L14 (-316, 39) -> (-316, 21) projected
  arc A13 (-316, 21) -> (-315, 20) centre (-315, 21) ccw projected
  line L15 (-315, 20) -> (-301.6658, 20) projected
  arc A14 (-300.3574, 19.8258) -> (-301.6658, 20) centre (-301.6658, 15) ccw projected
  line L16 (-300.3574, 19.8258) -> (-80.3426, -39.8258) projected
  arc A15 (-80.3426, -39.8258) -> (-79.0342, -40) centre (-79.0342, -35) ccw projected
  line L17 (-79.0342, -40) -> (-21.7, -40) projected
  arc A16 (-19.7, -42) -> (-21.7, -40) centre (-21.7, -42) ccw projected
  line L18 (-19.7, -42) -> (-19.7, -57) projected
  arc A17 (-19.7, -57) -> (-17.7, -59) centre (-17.7, -57) ccw projected
  line L19 (-17.7, -59) -> (17.7, -59) projected
  circle A18 centre (-28, 23.65) radius 2.65 projected
  circle A19 centre (-48, 23.65) radius 2.65 projected
  circle A20 centre (-306, 30) radius 2.6 projected
  circle A21 centre (-13, -52.3) radius 2.1 projected
  circle A22 centre (13, -52.3) radius 2.1 projected
  circle A23 centre (13, -26.3) radius 2.1 projected
  circle A24 centre (-13, -26.3) radius 2.1 projected
  circle A25 centre (-13, 26.3) radius 2.1 projected
  circle A26 centre (13, 26.3) radius 2.1 projected
  circle A27 centre (13, 52.3) radius 2.1 projected
  circle A28 centre (-13, 52.3) radius 2.1 projected
  line L20 (-163.15, 17.9395) -> (-148.15, 9.2793)
  line L21 (-148.15, 9.2793) -> (-133.15, 17.9395)
  line L22 (-148.15, 9.2793) -> (-148.15, -8.0412) construction
  line L23 (-148.15, 0.619) -> (-163.15, 9.2793)
  line L24 (-148.15, 0.619) -> (-133.15, 9.2793)
  line L25 (-133.15, 15.0528) -> (-148.15, 6.3925)
  line L26 (-148.15, 6.3925) -> (-163.15, 15.0528)
  line L27 (-163.15, 6.3925) -> (-148.15, -2.2677)
  line L28 (-148.15, -2.2677) -> (-133.15, 6.3925)
  line L29 (-51.75, 27.5) -> (-315, 27.5) construction
  line L30 (-148.15, 40) -> (-148.15, -21.4415) construction
  line L31 (-316, 30) -> (19.7, 30) construction
  point P0 (0, 0)
  point P1 (-148.15, 30)
  dimension "d132" = 30
  dimension "d133" = 5
  dimension "d134" = 2.5
  dimension "d135" = 5
equation "\"d54\" = d53"
properties part number "Z-Axis Bed Plates"
